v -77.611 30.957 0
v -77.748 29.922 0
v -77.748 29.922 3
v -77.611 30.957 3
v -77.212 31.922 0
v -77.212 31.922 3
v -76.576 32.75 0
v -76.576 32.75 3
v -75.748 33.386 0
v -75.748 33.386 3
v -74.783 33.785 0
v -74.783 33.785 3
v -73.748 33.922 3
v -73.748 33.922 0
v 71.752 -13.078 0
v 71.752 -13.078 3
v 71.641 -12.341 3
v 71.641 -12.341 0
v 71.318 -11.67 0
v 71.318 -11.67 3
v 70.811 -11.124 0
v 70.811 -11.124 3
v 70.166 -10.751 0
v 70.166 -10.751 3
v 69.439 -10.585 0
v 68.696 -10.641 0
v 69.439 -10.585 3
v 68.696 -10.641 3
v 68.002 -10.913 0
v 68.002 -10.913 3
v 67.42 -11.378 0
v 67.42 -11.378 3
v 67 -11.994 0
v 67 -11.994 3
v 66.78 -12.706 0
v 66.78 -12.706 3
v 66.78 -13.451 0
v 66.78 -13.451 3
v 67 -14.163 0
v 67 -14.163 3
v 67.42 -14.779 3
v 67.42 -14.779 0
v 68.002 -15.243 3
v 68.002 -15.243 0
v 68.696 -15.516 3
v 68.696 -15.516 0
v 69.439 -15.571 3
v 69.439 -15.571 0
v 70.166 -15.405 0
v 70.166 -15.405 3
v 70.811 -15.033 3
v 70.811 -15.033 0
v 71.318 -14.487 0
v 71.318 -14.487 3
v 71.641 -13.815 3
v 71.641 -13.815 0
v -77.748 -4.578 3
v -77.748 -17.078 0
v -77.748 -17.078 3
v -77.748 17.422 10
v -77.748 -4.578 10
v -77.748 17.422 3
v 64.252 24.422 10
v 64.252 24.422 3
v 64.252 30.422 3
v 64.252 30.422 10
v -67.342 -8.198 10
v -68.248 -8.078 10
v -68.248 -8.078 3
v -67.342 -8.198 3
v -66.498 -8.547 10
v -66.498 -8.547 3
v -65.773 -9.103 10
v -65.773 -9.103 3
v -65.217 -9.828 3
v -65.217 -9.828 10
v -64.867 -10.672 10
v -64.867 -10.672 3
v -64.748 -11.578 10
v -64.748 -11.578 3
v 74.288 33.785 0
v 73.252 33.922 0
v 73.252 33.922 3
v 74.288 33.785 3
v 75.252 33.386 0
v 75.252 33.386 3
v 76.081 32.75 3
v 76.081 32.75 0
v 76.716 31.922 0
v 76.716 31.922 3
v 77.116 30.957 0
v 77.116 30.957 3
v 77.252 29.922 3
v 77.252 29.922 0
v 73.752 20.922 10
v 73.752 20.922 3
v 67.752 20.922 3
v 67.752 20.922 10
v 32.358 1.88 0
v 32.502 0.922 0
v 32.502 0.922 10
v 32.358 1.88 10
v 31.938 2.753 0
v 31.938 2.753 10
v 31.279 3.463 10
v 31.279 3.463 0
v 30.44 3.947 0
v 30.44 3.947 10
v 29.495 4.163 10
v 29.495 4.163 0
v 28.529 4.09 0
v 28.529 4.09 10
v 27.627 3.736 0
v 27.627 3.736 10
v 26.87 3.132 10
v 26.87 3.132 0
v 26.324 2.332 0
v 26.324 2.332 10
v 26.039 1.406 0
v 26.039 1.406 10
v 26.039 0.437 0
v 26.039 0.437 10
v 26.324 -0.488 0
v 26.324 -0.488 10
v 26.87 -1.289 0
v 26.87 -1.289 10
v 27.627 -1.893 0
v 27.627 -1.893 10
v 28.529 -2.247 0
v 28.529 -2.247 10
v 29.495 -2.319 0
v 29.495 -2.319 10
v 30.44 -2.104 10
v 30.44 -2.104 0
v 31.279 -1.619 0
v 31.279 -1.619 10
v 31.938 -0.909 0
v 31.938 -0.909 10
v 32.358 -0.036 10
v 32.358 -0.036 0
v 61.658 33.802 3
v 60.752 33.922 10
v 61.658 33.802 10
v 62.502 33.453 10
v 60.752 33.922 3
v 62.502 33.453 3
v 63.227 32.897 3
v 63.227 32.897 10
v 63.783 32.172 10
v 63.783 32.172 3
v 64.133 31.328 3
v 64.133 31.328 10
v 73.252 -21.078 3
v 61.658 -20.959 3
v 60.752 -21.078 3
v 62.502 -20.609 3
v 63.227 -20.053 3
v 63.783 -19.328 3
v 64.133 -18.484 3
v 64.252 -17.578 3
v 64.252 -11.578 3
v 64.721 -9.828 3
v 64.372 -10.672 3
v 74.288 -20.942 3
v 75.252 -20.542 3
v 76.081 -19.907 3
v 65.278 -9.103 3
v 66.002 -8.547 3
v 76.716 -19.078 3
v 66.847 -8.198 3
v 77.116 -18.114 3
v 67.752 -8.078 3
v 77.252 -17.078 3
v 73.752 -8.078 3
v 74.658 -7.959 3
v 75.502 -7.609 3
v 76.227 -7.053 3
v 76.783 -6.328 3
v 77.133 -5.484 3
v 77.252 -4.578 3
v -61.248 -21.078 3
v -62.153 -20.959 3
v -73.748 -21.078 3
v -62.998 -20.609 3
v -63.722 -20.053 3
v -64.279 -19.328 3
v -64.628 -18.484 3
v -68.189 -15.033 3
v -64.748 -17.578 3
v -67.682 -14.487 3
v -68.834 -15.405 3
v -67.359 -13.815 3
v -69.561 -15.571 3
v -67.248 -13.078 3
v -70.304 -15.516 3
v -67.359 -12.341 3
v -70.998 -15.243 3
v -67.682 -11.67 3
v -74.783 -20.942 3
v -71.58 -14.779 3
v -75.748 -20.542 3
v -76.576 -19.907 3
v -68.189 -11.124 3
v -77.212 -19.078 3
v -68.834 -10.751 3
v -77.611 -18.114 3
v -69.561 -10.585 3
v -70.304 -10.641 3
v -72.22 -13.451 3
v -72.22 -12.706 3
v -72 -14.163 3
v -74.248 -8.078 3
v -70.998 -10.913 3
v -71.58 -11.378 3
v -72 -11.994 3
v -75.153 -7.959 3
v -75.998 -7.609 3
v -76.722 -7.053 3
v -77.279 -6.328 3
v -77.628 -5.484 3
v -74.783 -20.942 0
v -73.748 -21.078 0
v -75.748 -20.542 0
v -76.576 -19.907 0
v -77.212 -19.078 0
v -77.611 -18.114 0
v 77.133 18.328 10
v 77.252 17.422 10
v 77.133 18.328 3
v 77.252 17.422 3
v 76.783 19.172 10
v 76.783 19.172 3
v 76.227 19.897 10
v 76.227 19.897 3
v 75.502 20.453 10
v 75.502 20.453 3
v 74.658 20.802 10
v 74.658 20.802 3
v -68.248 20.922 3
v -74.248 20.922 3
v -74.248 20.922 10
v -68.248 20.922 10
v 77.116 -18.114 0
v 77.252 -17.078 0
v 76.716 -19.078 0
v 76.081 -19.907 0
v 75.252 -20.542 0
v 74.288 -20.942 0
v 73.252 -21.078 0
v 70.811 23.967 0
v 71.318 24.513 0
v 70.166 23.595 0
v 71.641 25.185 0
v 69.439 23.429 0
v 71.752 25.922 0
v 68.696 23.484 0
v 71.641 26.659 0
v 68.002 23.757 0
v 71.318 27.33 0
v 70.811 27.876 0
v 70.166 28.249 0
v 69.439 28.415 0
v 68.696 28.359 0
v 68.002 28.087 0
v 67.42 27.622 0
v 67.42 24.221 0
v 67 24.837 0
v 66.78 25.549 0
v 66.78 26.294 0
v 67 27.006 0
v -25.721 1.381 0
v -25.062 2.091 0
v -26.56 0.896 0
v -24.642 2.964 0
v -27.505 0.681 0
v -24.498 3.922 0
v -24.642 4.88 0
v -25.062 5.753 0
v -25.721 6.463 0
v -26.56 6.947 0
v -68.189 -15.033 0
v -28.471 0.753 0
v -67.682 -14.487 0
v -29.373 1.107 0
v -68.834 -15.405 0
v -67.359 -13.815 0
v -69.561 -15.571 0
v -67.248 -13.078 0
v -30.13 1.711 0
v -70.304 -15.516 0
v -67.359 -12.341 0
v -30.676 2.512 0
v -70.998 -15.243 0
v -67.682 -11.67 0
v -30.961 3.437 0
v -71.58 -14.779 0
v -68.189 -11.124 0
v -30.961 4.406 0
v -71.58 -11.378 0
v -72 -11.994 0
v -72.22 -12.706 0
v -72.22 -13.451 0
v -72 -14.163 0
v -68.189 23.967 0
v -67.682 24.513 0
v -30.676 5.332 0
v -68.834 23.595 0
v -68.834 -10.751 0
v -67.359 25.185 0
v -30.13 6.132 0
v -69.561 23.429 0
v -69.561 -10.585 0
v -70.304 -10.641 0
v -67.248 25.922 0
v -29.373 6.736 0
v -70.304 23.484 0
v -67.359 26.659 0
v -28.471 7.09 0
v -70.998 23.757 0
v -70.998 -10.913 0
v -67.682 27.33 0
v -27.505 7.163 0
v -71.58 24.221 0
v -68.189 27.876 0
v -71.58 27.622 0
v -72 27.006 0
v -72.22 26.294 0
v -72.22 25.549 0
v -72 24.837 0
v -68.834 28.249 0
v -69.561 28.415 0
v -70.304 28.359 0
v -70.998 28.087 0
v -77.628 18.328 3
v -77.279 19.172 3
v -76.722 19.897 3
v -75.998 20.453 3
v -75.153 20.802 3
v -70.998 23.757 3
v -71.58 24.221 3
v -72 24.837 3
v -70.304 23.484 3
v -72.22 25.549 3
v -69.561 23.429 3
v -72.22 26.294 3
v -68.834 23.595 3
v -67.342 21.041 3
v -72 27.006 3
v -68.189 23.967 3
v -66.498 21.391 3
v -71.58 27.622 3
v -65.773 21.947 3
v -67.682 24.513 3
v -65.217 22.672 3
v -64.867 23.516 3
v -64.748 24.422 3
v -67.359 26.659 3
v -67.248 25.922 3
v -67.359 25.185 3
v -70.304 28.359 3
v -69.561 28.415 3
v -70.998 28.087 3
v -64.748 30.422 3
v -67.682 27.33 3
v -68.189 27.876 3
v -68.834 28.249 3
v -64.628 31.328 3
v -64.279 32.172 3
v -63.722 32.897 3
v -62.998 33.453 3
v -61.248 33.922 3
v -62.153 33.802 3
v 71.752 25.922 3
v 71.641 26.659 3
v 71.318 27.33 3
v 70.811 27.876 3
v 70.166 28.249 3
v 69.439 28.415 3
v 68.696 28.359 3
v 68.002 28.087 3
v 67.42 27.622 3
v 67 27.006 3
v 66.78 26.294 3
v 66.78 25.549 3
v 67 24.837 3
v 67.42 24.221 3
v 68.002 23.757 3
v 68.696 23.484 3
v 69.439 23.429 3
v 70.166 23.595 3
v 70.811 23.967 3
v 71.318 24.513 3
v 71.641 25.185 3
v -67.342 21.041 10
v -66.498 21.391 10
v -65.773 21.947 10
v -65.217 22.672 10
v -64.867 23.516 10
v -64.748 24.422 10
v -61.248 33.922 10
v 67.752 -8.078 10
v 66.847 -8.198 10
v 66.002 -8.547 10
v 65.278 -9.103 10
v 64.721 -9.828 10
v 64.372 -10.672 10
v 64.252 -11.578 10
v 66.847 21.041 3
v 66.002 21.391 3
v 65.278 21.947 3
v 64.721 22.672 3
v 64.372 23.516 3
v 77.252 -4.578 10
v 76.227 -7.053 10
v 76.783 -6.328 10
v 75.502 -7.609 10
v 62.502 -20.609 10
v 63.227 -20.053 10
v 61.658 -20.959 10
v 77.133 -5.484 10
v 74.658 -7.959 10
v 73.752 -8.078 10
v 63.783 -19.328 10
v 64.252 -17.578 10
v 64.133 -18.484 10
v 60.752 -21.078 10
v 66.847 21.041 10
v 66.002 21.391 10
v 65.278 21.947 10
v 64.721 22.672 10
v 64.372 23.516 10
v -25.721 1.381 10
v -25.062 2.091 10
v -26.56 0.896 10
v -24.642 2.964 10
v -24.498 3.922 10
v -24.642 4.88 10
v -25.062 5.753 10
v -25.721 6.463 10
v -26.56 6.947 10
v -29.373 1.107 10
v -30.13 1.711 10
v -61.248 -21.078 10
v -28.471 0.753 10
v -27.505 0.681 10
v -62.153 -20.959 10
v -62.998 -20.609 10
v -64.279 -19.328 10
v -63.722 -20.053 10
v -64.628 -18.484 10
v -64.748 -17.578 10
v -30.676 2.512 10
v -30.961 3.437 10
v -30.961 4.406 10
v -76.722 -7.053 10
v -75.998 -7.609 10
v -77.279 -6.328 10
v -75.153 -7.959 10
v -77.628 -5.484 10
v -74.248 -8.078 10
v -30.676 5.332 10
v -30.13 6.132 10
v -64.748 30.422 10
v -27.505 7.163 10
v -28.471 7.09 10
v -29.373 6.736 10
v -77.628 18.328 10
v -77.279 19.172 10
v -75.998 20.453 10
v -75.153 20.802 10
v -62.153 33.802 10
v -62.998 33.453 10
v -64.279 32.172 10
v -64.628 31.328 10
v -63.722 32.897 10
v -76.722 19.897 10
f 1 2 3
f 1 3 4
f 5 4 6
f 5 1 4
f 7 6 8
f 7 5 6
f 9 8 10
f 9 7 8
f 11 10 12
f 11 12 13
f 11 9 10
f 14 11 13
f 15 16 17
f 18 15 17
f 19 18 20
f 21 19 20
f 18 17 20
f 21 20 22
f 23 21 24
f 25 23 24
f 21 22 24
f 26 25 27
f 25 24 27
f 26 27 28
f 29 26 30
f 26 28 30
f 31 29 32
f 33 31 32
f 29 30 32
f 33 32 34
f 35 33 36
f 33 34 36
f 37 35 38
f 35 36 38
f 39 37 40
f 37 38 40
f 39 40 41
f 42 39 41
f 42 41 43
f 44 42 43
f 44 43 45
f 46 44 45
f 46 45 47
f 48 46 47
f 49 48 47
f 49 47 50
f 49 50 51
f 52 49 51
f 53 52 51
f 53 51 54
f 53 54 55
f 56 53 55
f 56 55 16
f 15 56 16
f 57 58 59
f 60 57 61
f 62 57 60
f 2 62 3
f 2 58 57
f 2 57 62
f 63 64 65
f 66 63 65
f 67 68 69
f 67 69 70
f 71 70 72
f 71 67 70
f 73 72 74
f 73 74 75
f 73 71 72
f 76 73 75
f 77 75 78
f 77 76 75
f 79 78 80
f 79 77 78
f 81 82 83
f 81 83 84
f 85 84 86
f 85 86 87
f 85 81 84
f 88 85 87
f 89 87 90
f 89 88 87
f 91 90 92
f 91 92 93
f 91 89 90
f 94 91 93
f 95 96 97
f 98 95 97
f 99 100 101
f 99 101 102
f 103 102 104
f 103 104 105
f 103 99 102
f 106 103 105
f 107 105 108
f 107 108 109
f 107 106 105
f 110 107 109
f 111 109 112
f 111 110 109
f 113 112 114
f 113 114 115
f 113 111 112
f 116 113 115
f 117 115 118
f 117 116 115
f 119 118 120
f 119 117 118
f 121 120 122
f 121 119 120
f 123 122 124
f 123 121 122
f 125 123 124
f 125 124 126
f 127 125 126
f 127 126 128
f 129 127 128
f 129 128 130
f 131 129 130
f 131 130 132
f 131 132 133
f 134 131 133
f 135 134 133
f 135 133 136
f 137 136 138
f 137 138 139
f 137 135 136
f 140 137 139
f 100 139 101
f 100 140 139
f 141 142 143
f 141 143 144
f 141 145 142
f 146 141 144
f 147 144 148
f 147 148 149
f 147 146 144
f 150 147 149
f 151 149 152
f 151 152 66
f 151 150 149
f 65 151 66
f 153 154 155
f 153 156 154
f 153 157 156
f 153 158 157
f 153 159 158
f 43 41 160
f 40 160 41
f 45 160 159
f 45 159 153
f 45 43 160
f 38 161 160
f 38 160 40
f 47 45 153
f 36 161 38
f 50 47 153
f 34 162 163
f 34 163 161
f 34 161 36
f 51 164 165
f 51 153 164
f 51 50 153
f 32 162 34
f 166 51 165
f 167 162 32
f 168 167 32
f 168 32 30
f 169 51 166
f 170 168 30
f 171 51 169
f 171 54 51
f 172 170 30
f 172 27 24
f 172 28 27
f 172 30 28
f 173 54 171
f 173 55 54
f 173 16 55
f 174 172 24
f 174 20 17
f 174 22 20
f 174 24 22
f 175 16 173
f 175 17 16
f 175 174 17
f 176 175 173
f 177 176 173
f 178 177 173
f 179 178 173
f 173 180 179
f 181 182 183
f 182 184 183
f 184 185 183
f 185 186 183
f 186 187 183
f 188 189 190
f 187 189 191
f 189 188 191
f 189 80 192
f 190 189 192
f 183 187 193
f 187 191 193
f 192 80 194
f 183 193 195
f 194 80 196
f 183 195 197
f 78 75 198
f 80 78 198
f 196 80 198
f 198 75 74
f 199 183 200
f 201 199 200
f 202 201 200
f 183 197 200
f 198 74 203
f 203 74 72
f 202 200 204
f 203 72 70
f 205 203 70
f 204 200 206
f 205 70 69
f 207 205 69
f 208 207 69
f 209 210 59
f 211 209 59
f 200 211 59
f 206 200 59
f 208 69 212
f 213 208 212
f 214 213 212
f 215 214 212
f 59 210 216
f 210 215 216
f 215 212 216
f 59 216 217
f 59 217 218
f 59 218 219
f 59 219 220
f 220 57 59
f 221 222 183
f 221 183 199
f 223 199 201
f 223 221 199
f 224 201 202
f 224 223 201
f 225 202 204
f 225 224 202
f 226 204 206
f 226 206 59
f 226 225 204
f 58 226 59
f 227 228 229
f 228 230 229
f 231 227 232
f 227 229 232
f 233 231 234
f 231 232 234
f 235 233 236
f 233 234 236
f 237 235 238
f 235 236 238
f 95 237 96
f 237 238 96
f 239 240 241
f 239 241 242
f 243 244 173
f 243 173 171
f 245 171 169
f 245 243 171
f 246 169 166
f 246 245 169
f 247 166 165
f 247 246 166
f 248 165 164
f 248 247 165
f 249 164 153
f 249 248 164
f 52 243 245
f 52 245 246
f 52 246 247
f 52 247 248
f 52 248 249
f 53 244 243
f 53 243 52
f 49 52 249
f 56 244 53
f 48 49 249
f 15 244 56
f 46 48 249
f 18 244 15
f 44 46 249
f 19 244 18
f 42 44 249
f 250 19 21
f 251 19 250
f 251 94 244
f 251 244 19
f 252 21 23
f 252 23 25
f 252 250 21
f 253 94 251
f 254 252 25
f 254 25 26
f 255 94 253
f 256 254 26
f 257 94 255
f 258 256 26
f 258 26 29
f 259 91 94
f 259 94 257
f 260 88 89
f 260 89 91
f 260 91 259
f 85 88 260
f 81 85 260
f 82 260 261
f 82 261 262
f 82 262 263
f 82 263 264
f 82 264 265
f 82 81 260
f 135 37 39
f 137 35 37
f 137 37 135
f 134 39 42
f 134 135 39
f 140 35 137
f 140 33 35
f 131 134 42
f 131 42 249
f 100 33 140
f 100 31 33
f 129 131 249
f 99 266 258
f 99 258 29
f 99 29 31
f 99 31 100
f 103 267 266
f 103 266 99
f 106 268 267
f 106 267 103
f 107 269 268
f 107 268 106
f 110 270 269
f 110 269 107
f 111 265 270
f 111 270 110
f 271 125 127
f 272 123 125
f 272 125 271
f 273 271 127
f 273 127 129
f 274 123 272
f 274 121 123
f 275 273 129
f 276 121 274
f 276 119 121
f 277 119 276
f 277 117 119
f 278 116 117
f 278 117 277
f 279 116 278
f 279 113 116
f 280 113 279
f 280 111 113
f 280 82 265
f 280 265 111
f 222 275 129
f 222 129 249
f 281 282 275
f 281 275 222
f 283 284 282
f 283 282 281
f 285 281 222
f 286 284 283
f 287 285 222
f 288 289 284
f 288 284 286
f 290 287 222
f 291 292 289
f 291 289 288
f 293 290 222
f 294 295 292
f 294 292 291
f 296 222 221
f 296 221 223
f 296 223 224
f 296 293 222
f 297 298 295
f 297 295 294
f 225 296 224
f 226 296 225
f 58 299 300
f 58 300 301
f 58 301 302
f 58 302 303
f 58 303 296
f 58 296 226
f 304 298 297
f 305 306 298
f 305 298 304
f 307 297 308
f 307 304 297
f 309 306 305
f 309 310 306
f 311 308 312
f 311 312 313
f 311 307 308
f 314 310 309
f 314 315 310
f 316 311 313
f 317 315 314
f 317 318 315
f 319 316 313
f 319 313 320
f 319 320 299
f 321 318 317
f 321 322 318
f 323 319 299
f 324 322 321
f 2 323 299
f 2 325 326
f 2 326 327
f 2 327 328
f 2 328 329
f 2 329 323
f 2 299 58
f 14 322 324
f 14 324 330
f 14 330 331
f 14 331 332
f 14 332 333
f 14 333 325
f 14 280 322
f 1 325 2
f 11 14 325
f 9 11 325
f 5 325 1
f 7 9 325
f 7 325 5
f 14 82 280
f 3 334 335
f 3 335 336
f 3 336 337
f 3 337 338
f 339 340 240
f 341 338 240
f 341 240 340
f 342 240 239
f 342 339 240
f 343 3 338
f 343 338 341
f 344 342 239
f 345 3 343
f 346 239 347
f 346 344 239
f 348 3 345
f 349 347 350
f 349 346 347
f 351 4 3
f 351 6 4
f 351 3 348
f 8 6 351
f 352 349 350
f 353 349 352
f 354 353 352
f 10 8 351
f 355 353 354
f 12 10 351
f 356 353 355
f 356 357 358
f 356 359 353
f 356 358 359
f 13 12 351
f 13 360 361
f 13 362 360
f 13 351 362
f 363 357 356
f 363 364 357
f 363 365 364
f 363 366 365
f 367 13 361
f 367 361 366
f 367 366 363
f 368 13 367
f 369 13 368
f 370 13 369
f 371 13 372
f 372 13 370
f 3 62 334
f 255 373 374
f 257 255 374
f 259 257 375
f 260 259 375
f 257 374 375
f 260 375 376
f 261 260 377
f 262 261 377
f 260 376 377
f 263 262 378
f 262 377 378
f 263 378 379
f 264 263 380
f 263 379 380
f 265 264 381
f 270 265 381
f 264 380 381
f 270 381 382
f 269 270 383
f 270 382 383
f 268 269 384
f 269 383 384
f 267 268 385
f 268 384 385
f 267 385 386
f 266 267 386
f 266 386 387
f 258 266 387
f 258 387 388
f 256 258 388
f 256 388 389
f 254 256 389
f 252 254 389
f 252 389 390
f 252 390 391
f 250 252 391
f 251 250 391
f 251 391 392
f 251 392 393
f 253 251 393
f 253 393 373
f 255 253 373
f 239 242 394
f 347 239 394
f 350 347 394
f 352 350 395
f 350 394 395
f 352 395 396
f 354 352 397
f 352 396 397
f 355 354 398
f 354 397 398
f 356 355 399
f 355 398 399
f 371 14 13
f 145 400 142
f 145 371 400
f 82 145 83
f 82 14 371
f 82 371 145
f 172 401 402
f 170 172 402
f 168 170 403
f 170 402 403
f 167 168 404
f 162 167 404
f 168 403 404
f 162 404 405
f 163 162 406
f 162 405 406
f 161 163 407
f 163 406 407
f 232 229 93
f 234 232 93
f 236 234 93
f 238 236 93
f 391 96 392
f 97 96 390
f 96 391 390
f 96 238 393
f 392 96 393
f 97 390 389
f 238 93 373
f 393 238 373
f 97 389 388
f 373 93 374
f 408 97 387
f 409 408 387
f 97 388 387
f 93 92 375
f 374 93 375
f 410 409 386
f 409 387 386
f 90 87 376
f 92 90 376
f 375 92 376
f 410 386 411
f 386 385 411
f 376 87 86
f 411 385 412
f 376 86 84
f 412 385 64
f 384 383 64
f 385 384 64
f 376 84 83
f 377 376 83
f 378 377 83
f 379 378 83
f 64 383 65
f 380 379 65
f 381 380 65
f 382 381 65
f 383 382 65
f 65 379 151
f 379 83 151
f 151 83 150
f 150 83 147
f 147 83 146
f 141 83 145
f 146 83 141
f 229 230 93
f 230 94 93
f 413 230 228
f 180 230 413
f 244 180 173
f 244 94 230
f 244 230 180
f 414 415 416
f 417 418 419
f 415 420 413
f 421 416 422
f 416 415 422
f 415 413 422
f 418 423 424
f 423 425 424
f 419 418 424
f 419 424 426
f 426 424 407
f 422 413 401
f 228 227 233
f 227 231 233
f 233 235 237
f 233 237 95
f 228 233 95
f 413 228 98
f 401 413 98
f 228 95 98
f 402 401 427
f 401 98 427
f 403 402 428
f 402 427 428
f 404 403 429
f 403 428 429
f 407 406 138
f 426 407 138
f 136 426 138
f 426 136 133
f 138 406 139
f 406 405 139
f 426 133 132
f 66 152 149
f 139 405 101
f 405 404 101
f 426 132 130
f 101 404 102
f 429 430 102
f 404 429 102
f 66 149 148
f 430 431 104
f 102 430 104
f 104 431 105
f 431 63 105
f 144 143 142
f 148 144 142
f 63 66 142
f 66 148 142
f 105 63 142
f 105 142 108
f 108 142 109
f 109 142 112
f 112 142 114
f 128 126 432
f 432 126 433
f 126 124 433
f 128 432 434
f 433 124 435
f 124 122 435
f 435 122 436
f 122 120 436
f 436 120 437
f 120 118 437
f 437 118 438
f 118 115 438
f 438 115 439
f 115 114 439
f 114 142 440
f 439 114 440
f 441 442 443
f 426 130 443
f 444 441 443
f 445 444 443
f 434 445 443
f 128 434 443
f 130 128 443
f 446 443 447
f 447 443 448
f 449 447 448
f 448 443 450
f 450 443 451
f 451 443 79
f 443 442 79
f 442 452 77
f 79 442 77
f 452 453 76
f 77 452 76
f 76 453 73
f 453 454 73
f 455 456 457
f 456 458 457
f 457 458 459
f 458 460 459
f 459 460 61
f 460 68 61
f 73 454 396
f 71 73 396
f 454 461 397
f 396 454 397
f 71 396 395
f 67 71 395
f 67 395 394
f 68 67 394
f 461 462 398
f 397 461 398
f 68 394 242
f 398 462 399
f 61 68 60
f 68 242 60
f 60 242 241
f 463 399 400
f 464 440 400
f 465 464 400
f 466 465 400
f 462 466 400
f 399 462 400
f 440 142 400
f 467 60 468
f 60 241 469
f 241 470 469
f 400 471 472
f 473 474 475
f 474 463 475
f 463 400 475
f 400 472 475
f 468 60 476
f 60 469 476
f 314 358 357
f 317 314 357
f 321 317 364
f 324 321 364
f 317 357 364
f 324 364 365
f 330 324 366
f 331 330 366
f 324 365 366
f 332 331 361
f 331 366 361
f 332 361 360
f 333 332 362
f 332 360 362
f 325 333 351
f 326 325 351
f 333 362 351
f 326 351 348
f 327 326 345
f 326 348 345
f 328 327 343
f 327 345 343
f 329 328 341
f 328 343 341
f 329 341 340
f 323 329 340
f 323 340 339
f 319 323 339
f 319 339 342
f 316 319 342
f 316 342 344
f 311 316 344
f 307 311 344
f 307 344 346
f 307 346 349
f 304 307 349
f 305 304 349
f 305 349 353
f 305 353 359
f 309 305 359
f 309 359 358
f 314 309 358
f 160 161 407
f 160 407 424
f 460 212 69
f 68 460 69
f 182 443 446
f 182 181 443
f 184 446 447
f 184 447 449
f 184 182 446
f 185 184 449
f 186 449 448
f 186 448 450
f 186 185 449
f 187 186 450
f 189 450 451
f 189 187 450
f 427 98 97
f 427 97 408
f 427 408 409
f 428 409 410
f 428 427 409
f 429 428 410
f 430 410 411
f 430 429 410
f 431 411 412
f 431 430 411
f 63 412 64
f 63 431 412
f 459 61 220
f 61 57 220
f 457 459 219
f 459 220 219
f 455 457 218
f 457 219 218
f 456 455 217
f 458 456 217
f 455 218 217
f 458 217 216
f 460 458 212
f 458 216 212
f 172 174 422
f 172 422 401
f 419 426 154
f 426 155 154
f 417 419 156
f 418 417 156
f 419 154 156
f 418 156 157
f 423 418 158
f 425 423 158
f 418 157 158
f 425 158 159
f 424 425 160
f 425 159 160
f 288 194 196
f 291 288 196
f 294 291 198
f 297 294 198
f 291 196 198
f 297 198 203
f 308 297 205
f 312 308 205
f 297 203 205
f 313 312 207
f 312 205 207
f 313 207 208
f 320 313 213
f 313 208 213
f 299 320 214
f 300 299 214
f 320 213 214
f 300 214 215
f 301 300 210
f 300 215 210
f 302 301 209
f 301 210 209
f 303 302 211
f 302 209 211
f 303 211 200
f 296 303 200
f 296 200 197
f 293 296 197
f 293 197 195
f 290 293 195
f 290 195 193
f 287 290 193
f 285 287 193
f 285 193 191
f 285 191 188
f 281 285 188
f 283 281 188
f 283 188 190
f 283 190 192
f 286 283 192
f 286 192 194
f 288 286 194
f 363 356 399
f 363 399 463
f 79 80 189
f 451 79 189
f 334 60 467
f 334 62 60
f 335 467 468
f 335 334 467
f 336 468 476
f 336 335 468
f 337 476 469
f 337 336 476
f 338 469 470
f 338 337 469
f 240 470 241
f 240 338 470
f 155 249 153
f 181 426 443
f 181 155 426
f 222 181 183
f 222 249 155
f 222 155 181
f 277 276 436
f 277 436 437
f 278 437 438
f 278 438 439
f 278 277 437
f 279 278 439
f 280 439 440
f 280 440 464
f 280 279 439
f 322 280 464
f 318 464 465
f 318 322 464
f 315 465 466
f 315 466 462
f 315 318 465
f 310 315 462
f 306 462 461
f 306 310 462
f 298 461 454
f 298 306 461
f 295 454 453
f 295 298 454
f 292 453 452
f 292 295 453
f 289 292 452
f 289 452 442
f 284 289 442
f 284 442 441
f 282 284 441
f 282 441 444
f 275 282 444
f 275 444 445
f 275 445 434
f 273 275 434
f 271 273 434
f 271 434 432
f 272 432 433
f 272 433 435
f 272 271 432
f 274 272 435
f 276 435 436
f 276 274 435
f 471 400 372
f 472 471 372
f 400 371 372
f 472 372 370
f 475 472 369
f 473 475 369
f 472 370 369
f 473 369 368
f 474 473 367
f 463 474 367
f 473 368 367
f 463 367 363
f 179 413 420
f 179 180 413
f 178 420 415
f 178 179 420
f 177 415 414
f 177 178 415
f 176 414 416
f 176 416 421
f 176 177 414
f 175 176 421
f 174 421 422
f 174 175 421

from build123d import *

# Parameters (mm, degrees)
SKETCH1_R           = 3.25
BOSS_EXTRUDE1_DEPTH = 10
CUT_EXTRUDE1_DEPTH  = 7
SKETCH3_R           = 2.5
CUT_EXTRUDE2_DEPTH  = 10
FILLET1_R           = 3.5


with BuildPart() as part:
    # Sketch1 → Boss-Extrude1 (new body)
    with BuildSketch(Plane.XY):
        with BuildLine():
            Line((-73.747603834, 33.92172524), (73.252396166, 33.92172524))
            ThreePointArc((73.252396166, 33.92172524), (76.080823291, 32.750152364), (77.252396166, 29.92172524))
            Line((77.252396166, 29.92172524), (77.252396166, -17.07827476))
            ThreePointArc((77.252396166, -17.07827476), (76.080823291, -19.906701885), (73.252396166, -21.07827476))
            Line((73.252396166, -21.07827476), (-73.747603834, -21.07827476))
            ThreePointArc((-73.747603834, -21.07827476), (-76.576030959, -19.906701885), (-77.747603834, -17.07827476))
            Line((-77.747603834, -17.07827476), (-77.747603834, 29.92172524))
            ThreePointArc((-77.747603834, 29.92172524), (-76.576030959, 32.750152364), (-73.747603834, 33.92172524))
        make_face()
        with Locations((-27.747603834, 3.92172524)):
            Circle(SKETCH1_R, mode=Mode.SUBTRACT)
        with Locations((29.252396166, 0.92172524)):
            Circle(SKETCH1_R, mode=Mode.SUBTRACT)
    extrude(amount=BOSS_EXTRUDE1_DEPTH)

    # Sketch2 → Cut-Extrude1 (cut)
    with BuildSketch(Plane.XY.offset(10)):
        with BuildLine():
            Line((-77.747603834, 20.92172524), (-68.247603834, 20.92172524))
            ThreePointArc((-68.247603834, 20.92172524), (-65.7727301, 21.946851505), (-64.747603834, 24.42172524))
            Line((-64.747603834, 24.42172524), (-64.747603834, 33.92172524))
            Line((-64.747603834, 33.92172524), (-77.747603834, 33.92172524))
            Line((-77.747603834, 33.92172524), (-77.747603834, 20.92172524))
        make_face()
        with BuildLine():
            Line((-77.747603834, -8.07827476), (-68.247603834, -8.07827476))
            ThreePointArc((-68.247603834, -8.07827476), (-65.7727301, -9.103401026), (-64.747603834, -11.57827476))
            Line((-64.747603834, -11.57827476), (-64.747603834, -21.07827476))
            Line((-64.747603834, -21.07827476), (-77.747603834, -21.07827476))
            Line((-77.747603834, -21.07827476), (-77.747603834, -8.07827476))
        make_face()
        with BuildLine():
            Line((64.252396166, -21.07827476), (77.252396166, -21.07827476))
            Line((77.252396166, -21.07827476), (77.252396166, -8.07827476))
            Line((77.252396166, -8.07827476), (67.752396166, -8.07827476))
            ThreePointArc((67.752396166, -8.07827476), (65.277522432, -9.103401026), (64.252396166, -11.57827476))
            Line((64.252396166, -11.57827476), (64.252396166, -21.07827476))
        make_face()
        with BuildLine():
            Line((77.252396166, 20.92172524), (67.752396166, 20.92172524))
            ThreePointArc((67.752396166, 20.92172524), (65.277522432, 21.946851505), (64.252396166, 24.42172524))
            Line((64.252396166, 24.42172524), (64.252396166, 33.92172524))
            Line((64.252396166, 33.92172524), (77.252396166, 33.92172524))
            Line((77.252396166, 33.92172524), (77.252396166, 20.92172524))
        make_face()
    extrude(amount=-CUT_EXTRUDE1_DEPTH, mode=Mode.SUBTRACT)

    # Sketch3 → Cut-Extrude2 (cut)
    with BuildSketch(Plane.XY.offset(3)):
        with Locations((-69.747603834, 25.92172524)):
            Circle(SKETCH3_R)
        with Locations((69.252396166, 25.92172524)):
            Circle(SKETCH3_R)
        with Locations((69.252396166, -13.07827476)):
            Circle(SKETCH3_R)
        with Locations((-69.747603834, -13.07827476)):
            Circle(SKETCH3_R)
    extrude(amount=-CUT_EXTRUDE2_DEPTH, mode=Mode.SUBTRACT)

    # Fillet1
    fillet1_edges = [part.edges().sort_by_distance(p)[0] for p in [
        (64.252396166, 33.92172524, 6.5),
        (77.252396166, 20.92172524, 6.5),
        (77.252396166, -8.07827476, 6.5),
        (64.252396166, -21.07827476, 6.5),
        (-64.747603834, -21.07827476, 6.5),
        (-77.747603834, -8.07827476, 6.5),
        (-77.747603834, 20.92172524, 6.5),
        (-64.747603834, 33.92172524, 6.5),
    ]]
    fillet(fillet1_edges, radius=FILLET1_R)


solid = part.part
